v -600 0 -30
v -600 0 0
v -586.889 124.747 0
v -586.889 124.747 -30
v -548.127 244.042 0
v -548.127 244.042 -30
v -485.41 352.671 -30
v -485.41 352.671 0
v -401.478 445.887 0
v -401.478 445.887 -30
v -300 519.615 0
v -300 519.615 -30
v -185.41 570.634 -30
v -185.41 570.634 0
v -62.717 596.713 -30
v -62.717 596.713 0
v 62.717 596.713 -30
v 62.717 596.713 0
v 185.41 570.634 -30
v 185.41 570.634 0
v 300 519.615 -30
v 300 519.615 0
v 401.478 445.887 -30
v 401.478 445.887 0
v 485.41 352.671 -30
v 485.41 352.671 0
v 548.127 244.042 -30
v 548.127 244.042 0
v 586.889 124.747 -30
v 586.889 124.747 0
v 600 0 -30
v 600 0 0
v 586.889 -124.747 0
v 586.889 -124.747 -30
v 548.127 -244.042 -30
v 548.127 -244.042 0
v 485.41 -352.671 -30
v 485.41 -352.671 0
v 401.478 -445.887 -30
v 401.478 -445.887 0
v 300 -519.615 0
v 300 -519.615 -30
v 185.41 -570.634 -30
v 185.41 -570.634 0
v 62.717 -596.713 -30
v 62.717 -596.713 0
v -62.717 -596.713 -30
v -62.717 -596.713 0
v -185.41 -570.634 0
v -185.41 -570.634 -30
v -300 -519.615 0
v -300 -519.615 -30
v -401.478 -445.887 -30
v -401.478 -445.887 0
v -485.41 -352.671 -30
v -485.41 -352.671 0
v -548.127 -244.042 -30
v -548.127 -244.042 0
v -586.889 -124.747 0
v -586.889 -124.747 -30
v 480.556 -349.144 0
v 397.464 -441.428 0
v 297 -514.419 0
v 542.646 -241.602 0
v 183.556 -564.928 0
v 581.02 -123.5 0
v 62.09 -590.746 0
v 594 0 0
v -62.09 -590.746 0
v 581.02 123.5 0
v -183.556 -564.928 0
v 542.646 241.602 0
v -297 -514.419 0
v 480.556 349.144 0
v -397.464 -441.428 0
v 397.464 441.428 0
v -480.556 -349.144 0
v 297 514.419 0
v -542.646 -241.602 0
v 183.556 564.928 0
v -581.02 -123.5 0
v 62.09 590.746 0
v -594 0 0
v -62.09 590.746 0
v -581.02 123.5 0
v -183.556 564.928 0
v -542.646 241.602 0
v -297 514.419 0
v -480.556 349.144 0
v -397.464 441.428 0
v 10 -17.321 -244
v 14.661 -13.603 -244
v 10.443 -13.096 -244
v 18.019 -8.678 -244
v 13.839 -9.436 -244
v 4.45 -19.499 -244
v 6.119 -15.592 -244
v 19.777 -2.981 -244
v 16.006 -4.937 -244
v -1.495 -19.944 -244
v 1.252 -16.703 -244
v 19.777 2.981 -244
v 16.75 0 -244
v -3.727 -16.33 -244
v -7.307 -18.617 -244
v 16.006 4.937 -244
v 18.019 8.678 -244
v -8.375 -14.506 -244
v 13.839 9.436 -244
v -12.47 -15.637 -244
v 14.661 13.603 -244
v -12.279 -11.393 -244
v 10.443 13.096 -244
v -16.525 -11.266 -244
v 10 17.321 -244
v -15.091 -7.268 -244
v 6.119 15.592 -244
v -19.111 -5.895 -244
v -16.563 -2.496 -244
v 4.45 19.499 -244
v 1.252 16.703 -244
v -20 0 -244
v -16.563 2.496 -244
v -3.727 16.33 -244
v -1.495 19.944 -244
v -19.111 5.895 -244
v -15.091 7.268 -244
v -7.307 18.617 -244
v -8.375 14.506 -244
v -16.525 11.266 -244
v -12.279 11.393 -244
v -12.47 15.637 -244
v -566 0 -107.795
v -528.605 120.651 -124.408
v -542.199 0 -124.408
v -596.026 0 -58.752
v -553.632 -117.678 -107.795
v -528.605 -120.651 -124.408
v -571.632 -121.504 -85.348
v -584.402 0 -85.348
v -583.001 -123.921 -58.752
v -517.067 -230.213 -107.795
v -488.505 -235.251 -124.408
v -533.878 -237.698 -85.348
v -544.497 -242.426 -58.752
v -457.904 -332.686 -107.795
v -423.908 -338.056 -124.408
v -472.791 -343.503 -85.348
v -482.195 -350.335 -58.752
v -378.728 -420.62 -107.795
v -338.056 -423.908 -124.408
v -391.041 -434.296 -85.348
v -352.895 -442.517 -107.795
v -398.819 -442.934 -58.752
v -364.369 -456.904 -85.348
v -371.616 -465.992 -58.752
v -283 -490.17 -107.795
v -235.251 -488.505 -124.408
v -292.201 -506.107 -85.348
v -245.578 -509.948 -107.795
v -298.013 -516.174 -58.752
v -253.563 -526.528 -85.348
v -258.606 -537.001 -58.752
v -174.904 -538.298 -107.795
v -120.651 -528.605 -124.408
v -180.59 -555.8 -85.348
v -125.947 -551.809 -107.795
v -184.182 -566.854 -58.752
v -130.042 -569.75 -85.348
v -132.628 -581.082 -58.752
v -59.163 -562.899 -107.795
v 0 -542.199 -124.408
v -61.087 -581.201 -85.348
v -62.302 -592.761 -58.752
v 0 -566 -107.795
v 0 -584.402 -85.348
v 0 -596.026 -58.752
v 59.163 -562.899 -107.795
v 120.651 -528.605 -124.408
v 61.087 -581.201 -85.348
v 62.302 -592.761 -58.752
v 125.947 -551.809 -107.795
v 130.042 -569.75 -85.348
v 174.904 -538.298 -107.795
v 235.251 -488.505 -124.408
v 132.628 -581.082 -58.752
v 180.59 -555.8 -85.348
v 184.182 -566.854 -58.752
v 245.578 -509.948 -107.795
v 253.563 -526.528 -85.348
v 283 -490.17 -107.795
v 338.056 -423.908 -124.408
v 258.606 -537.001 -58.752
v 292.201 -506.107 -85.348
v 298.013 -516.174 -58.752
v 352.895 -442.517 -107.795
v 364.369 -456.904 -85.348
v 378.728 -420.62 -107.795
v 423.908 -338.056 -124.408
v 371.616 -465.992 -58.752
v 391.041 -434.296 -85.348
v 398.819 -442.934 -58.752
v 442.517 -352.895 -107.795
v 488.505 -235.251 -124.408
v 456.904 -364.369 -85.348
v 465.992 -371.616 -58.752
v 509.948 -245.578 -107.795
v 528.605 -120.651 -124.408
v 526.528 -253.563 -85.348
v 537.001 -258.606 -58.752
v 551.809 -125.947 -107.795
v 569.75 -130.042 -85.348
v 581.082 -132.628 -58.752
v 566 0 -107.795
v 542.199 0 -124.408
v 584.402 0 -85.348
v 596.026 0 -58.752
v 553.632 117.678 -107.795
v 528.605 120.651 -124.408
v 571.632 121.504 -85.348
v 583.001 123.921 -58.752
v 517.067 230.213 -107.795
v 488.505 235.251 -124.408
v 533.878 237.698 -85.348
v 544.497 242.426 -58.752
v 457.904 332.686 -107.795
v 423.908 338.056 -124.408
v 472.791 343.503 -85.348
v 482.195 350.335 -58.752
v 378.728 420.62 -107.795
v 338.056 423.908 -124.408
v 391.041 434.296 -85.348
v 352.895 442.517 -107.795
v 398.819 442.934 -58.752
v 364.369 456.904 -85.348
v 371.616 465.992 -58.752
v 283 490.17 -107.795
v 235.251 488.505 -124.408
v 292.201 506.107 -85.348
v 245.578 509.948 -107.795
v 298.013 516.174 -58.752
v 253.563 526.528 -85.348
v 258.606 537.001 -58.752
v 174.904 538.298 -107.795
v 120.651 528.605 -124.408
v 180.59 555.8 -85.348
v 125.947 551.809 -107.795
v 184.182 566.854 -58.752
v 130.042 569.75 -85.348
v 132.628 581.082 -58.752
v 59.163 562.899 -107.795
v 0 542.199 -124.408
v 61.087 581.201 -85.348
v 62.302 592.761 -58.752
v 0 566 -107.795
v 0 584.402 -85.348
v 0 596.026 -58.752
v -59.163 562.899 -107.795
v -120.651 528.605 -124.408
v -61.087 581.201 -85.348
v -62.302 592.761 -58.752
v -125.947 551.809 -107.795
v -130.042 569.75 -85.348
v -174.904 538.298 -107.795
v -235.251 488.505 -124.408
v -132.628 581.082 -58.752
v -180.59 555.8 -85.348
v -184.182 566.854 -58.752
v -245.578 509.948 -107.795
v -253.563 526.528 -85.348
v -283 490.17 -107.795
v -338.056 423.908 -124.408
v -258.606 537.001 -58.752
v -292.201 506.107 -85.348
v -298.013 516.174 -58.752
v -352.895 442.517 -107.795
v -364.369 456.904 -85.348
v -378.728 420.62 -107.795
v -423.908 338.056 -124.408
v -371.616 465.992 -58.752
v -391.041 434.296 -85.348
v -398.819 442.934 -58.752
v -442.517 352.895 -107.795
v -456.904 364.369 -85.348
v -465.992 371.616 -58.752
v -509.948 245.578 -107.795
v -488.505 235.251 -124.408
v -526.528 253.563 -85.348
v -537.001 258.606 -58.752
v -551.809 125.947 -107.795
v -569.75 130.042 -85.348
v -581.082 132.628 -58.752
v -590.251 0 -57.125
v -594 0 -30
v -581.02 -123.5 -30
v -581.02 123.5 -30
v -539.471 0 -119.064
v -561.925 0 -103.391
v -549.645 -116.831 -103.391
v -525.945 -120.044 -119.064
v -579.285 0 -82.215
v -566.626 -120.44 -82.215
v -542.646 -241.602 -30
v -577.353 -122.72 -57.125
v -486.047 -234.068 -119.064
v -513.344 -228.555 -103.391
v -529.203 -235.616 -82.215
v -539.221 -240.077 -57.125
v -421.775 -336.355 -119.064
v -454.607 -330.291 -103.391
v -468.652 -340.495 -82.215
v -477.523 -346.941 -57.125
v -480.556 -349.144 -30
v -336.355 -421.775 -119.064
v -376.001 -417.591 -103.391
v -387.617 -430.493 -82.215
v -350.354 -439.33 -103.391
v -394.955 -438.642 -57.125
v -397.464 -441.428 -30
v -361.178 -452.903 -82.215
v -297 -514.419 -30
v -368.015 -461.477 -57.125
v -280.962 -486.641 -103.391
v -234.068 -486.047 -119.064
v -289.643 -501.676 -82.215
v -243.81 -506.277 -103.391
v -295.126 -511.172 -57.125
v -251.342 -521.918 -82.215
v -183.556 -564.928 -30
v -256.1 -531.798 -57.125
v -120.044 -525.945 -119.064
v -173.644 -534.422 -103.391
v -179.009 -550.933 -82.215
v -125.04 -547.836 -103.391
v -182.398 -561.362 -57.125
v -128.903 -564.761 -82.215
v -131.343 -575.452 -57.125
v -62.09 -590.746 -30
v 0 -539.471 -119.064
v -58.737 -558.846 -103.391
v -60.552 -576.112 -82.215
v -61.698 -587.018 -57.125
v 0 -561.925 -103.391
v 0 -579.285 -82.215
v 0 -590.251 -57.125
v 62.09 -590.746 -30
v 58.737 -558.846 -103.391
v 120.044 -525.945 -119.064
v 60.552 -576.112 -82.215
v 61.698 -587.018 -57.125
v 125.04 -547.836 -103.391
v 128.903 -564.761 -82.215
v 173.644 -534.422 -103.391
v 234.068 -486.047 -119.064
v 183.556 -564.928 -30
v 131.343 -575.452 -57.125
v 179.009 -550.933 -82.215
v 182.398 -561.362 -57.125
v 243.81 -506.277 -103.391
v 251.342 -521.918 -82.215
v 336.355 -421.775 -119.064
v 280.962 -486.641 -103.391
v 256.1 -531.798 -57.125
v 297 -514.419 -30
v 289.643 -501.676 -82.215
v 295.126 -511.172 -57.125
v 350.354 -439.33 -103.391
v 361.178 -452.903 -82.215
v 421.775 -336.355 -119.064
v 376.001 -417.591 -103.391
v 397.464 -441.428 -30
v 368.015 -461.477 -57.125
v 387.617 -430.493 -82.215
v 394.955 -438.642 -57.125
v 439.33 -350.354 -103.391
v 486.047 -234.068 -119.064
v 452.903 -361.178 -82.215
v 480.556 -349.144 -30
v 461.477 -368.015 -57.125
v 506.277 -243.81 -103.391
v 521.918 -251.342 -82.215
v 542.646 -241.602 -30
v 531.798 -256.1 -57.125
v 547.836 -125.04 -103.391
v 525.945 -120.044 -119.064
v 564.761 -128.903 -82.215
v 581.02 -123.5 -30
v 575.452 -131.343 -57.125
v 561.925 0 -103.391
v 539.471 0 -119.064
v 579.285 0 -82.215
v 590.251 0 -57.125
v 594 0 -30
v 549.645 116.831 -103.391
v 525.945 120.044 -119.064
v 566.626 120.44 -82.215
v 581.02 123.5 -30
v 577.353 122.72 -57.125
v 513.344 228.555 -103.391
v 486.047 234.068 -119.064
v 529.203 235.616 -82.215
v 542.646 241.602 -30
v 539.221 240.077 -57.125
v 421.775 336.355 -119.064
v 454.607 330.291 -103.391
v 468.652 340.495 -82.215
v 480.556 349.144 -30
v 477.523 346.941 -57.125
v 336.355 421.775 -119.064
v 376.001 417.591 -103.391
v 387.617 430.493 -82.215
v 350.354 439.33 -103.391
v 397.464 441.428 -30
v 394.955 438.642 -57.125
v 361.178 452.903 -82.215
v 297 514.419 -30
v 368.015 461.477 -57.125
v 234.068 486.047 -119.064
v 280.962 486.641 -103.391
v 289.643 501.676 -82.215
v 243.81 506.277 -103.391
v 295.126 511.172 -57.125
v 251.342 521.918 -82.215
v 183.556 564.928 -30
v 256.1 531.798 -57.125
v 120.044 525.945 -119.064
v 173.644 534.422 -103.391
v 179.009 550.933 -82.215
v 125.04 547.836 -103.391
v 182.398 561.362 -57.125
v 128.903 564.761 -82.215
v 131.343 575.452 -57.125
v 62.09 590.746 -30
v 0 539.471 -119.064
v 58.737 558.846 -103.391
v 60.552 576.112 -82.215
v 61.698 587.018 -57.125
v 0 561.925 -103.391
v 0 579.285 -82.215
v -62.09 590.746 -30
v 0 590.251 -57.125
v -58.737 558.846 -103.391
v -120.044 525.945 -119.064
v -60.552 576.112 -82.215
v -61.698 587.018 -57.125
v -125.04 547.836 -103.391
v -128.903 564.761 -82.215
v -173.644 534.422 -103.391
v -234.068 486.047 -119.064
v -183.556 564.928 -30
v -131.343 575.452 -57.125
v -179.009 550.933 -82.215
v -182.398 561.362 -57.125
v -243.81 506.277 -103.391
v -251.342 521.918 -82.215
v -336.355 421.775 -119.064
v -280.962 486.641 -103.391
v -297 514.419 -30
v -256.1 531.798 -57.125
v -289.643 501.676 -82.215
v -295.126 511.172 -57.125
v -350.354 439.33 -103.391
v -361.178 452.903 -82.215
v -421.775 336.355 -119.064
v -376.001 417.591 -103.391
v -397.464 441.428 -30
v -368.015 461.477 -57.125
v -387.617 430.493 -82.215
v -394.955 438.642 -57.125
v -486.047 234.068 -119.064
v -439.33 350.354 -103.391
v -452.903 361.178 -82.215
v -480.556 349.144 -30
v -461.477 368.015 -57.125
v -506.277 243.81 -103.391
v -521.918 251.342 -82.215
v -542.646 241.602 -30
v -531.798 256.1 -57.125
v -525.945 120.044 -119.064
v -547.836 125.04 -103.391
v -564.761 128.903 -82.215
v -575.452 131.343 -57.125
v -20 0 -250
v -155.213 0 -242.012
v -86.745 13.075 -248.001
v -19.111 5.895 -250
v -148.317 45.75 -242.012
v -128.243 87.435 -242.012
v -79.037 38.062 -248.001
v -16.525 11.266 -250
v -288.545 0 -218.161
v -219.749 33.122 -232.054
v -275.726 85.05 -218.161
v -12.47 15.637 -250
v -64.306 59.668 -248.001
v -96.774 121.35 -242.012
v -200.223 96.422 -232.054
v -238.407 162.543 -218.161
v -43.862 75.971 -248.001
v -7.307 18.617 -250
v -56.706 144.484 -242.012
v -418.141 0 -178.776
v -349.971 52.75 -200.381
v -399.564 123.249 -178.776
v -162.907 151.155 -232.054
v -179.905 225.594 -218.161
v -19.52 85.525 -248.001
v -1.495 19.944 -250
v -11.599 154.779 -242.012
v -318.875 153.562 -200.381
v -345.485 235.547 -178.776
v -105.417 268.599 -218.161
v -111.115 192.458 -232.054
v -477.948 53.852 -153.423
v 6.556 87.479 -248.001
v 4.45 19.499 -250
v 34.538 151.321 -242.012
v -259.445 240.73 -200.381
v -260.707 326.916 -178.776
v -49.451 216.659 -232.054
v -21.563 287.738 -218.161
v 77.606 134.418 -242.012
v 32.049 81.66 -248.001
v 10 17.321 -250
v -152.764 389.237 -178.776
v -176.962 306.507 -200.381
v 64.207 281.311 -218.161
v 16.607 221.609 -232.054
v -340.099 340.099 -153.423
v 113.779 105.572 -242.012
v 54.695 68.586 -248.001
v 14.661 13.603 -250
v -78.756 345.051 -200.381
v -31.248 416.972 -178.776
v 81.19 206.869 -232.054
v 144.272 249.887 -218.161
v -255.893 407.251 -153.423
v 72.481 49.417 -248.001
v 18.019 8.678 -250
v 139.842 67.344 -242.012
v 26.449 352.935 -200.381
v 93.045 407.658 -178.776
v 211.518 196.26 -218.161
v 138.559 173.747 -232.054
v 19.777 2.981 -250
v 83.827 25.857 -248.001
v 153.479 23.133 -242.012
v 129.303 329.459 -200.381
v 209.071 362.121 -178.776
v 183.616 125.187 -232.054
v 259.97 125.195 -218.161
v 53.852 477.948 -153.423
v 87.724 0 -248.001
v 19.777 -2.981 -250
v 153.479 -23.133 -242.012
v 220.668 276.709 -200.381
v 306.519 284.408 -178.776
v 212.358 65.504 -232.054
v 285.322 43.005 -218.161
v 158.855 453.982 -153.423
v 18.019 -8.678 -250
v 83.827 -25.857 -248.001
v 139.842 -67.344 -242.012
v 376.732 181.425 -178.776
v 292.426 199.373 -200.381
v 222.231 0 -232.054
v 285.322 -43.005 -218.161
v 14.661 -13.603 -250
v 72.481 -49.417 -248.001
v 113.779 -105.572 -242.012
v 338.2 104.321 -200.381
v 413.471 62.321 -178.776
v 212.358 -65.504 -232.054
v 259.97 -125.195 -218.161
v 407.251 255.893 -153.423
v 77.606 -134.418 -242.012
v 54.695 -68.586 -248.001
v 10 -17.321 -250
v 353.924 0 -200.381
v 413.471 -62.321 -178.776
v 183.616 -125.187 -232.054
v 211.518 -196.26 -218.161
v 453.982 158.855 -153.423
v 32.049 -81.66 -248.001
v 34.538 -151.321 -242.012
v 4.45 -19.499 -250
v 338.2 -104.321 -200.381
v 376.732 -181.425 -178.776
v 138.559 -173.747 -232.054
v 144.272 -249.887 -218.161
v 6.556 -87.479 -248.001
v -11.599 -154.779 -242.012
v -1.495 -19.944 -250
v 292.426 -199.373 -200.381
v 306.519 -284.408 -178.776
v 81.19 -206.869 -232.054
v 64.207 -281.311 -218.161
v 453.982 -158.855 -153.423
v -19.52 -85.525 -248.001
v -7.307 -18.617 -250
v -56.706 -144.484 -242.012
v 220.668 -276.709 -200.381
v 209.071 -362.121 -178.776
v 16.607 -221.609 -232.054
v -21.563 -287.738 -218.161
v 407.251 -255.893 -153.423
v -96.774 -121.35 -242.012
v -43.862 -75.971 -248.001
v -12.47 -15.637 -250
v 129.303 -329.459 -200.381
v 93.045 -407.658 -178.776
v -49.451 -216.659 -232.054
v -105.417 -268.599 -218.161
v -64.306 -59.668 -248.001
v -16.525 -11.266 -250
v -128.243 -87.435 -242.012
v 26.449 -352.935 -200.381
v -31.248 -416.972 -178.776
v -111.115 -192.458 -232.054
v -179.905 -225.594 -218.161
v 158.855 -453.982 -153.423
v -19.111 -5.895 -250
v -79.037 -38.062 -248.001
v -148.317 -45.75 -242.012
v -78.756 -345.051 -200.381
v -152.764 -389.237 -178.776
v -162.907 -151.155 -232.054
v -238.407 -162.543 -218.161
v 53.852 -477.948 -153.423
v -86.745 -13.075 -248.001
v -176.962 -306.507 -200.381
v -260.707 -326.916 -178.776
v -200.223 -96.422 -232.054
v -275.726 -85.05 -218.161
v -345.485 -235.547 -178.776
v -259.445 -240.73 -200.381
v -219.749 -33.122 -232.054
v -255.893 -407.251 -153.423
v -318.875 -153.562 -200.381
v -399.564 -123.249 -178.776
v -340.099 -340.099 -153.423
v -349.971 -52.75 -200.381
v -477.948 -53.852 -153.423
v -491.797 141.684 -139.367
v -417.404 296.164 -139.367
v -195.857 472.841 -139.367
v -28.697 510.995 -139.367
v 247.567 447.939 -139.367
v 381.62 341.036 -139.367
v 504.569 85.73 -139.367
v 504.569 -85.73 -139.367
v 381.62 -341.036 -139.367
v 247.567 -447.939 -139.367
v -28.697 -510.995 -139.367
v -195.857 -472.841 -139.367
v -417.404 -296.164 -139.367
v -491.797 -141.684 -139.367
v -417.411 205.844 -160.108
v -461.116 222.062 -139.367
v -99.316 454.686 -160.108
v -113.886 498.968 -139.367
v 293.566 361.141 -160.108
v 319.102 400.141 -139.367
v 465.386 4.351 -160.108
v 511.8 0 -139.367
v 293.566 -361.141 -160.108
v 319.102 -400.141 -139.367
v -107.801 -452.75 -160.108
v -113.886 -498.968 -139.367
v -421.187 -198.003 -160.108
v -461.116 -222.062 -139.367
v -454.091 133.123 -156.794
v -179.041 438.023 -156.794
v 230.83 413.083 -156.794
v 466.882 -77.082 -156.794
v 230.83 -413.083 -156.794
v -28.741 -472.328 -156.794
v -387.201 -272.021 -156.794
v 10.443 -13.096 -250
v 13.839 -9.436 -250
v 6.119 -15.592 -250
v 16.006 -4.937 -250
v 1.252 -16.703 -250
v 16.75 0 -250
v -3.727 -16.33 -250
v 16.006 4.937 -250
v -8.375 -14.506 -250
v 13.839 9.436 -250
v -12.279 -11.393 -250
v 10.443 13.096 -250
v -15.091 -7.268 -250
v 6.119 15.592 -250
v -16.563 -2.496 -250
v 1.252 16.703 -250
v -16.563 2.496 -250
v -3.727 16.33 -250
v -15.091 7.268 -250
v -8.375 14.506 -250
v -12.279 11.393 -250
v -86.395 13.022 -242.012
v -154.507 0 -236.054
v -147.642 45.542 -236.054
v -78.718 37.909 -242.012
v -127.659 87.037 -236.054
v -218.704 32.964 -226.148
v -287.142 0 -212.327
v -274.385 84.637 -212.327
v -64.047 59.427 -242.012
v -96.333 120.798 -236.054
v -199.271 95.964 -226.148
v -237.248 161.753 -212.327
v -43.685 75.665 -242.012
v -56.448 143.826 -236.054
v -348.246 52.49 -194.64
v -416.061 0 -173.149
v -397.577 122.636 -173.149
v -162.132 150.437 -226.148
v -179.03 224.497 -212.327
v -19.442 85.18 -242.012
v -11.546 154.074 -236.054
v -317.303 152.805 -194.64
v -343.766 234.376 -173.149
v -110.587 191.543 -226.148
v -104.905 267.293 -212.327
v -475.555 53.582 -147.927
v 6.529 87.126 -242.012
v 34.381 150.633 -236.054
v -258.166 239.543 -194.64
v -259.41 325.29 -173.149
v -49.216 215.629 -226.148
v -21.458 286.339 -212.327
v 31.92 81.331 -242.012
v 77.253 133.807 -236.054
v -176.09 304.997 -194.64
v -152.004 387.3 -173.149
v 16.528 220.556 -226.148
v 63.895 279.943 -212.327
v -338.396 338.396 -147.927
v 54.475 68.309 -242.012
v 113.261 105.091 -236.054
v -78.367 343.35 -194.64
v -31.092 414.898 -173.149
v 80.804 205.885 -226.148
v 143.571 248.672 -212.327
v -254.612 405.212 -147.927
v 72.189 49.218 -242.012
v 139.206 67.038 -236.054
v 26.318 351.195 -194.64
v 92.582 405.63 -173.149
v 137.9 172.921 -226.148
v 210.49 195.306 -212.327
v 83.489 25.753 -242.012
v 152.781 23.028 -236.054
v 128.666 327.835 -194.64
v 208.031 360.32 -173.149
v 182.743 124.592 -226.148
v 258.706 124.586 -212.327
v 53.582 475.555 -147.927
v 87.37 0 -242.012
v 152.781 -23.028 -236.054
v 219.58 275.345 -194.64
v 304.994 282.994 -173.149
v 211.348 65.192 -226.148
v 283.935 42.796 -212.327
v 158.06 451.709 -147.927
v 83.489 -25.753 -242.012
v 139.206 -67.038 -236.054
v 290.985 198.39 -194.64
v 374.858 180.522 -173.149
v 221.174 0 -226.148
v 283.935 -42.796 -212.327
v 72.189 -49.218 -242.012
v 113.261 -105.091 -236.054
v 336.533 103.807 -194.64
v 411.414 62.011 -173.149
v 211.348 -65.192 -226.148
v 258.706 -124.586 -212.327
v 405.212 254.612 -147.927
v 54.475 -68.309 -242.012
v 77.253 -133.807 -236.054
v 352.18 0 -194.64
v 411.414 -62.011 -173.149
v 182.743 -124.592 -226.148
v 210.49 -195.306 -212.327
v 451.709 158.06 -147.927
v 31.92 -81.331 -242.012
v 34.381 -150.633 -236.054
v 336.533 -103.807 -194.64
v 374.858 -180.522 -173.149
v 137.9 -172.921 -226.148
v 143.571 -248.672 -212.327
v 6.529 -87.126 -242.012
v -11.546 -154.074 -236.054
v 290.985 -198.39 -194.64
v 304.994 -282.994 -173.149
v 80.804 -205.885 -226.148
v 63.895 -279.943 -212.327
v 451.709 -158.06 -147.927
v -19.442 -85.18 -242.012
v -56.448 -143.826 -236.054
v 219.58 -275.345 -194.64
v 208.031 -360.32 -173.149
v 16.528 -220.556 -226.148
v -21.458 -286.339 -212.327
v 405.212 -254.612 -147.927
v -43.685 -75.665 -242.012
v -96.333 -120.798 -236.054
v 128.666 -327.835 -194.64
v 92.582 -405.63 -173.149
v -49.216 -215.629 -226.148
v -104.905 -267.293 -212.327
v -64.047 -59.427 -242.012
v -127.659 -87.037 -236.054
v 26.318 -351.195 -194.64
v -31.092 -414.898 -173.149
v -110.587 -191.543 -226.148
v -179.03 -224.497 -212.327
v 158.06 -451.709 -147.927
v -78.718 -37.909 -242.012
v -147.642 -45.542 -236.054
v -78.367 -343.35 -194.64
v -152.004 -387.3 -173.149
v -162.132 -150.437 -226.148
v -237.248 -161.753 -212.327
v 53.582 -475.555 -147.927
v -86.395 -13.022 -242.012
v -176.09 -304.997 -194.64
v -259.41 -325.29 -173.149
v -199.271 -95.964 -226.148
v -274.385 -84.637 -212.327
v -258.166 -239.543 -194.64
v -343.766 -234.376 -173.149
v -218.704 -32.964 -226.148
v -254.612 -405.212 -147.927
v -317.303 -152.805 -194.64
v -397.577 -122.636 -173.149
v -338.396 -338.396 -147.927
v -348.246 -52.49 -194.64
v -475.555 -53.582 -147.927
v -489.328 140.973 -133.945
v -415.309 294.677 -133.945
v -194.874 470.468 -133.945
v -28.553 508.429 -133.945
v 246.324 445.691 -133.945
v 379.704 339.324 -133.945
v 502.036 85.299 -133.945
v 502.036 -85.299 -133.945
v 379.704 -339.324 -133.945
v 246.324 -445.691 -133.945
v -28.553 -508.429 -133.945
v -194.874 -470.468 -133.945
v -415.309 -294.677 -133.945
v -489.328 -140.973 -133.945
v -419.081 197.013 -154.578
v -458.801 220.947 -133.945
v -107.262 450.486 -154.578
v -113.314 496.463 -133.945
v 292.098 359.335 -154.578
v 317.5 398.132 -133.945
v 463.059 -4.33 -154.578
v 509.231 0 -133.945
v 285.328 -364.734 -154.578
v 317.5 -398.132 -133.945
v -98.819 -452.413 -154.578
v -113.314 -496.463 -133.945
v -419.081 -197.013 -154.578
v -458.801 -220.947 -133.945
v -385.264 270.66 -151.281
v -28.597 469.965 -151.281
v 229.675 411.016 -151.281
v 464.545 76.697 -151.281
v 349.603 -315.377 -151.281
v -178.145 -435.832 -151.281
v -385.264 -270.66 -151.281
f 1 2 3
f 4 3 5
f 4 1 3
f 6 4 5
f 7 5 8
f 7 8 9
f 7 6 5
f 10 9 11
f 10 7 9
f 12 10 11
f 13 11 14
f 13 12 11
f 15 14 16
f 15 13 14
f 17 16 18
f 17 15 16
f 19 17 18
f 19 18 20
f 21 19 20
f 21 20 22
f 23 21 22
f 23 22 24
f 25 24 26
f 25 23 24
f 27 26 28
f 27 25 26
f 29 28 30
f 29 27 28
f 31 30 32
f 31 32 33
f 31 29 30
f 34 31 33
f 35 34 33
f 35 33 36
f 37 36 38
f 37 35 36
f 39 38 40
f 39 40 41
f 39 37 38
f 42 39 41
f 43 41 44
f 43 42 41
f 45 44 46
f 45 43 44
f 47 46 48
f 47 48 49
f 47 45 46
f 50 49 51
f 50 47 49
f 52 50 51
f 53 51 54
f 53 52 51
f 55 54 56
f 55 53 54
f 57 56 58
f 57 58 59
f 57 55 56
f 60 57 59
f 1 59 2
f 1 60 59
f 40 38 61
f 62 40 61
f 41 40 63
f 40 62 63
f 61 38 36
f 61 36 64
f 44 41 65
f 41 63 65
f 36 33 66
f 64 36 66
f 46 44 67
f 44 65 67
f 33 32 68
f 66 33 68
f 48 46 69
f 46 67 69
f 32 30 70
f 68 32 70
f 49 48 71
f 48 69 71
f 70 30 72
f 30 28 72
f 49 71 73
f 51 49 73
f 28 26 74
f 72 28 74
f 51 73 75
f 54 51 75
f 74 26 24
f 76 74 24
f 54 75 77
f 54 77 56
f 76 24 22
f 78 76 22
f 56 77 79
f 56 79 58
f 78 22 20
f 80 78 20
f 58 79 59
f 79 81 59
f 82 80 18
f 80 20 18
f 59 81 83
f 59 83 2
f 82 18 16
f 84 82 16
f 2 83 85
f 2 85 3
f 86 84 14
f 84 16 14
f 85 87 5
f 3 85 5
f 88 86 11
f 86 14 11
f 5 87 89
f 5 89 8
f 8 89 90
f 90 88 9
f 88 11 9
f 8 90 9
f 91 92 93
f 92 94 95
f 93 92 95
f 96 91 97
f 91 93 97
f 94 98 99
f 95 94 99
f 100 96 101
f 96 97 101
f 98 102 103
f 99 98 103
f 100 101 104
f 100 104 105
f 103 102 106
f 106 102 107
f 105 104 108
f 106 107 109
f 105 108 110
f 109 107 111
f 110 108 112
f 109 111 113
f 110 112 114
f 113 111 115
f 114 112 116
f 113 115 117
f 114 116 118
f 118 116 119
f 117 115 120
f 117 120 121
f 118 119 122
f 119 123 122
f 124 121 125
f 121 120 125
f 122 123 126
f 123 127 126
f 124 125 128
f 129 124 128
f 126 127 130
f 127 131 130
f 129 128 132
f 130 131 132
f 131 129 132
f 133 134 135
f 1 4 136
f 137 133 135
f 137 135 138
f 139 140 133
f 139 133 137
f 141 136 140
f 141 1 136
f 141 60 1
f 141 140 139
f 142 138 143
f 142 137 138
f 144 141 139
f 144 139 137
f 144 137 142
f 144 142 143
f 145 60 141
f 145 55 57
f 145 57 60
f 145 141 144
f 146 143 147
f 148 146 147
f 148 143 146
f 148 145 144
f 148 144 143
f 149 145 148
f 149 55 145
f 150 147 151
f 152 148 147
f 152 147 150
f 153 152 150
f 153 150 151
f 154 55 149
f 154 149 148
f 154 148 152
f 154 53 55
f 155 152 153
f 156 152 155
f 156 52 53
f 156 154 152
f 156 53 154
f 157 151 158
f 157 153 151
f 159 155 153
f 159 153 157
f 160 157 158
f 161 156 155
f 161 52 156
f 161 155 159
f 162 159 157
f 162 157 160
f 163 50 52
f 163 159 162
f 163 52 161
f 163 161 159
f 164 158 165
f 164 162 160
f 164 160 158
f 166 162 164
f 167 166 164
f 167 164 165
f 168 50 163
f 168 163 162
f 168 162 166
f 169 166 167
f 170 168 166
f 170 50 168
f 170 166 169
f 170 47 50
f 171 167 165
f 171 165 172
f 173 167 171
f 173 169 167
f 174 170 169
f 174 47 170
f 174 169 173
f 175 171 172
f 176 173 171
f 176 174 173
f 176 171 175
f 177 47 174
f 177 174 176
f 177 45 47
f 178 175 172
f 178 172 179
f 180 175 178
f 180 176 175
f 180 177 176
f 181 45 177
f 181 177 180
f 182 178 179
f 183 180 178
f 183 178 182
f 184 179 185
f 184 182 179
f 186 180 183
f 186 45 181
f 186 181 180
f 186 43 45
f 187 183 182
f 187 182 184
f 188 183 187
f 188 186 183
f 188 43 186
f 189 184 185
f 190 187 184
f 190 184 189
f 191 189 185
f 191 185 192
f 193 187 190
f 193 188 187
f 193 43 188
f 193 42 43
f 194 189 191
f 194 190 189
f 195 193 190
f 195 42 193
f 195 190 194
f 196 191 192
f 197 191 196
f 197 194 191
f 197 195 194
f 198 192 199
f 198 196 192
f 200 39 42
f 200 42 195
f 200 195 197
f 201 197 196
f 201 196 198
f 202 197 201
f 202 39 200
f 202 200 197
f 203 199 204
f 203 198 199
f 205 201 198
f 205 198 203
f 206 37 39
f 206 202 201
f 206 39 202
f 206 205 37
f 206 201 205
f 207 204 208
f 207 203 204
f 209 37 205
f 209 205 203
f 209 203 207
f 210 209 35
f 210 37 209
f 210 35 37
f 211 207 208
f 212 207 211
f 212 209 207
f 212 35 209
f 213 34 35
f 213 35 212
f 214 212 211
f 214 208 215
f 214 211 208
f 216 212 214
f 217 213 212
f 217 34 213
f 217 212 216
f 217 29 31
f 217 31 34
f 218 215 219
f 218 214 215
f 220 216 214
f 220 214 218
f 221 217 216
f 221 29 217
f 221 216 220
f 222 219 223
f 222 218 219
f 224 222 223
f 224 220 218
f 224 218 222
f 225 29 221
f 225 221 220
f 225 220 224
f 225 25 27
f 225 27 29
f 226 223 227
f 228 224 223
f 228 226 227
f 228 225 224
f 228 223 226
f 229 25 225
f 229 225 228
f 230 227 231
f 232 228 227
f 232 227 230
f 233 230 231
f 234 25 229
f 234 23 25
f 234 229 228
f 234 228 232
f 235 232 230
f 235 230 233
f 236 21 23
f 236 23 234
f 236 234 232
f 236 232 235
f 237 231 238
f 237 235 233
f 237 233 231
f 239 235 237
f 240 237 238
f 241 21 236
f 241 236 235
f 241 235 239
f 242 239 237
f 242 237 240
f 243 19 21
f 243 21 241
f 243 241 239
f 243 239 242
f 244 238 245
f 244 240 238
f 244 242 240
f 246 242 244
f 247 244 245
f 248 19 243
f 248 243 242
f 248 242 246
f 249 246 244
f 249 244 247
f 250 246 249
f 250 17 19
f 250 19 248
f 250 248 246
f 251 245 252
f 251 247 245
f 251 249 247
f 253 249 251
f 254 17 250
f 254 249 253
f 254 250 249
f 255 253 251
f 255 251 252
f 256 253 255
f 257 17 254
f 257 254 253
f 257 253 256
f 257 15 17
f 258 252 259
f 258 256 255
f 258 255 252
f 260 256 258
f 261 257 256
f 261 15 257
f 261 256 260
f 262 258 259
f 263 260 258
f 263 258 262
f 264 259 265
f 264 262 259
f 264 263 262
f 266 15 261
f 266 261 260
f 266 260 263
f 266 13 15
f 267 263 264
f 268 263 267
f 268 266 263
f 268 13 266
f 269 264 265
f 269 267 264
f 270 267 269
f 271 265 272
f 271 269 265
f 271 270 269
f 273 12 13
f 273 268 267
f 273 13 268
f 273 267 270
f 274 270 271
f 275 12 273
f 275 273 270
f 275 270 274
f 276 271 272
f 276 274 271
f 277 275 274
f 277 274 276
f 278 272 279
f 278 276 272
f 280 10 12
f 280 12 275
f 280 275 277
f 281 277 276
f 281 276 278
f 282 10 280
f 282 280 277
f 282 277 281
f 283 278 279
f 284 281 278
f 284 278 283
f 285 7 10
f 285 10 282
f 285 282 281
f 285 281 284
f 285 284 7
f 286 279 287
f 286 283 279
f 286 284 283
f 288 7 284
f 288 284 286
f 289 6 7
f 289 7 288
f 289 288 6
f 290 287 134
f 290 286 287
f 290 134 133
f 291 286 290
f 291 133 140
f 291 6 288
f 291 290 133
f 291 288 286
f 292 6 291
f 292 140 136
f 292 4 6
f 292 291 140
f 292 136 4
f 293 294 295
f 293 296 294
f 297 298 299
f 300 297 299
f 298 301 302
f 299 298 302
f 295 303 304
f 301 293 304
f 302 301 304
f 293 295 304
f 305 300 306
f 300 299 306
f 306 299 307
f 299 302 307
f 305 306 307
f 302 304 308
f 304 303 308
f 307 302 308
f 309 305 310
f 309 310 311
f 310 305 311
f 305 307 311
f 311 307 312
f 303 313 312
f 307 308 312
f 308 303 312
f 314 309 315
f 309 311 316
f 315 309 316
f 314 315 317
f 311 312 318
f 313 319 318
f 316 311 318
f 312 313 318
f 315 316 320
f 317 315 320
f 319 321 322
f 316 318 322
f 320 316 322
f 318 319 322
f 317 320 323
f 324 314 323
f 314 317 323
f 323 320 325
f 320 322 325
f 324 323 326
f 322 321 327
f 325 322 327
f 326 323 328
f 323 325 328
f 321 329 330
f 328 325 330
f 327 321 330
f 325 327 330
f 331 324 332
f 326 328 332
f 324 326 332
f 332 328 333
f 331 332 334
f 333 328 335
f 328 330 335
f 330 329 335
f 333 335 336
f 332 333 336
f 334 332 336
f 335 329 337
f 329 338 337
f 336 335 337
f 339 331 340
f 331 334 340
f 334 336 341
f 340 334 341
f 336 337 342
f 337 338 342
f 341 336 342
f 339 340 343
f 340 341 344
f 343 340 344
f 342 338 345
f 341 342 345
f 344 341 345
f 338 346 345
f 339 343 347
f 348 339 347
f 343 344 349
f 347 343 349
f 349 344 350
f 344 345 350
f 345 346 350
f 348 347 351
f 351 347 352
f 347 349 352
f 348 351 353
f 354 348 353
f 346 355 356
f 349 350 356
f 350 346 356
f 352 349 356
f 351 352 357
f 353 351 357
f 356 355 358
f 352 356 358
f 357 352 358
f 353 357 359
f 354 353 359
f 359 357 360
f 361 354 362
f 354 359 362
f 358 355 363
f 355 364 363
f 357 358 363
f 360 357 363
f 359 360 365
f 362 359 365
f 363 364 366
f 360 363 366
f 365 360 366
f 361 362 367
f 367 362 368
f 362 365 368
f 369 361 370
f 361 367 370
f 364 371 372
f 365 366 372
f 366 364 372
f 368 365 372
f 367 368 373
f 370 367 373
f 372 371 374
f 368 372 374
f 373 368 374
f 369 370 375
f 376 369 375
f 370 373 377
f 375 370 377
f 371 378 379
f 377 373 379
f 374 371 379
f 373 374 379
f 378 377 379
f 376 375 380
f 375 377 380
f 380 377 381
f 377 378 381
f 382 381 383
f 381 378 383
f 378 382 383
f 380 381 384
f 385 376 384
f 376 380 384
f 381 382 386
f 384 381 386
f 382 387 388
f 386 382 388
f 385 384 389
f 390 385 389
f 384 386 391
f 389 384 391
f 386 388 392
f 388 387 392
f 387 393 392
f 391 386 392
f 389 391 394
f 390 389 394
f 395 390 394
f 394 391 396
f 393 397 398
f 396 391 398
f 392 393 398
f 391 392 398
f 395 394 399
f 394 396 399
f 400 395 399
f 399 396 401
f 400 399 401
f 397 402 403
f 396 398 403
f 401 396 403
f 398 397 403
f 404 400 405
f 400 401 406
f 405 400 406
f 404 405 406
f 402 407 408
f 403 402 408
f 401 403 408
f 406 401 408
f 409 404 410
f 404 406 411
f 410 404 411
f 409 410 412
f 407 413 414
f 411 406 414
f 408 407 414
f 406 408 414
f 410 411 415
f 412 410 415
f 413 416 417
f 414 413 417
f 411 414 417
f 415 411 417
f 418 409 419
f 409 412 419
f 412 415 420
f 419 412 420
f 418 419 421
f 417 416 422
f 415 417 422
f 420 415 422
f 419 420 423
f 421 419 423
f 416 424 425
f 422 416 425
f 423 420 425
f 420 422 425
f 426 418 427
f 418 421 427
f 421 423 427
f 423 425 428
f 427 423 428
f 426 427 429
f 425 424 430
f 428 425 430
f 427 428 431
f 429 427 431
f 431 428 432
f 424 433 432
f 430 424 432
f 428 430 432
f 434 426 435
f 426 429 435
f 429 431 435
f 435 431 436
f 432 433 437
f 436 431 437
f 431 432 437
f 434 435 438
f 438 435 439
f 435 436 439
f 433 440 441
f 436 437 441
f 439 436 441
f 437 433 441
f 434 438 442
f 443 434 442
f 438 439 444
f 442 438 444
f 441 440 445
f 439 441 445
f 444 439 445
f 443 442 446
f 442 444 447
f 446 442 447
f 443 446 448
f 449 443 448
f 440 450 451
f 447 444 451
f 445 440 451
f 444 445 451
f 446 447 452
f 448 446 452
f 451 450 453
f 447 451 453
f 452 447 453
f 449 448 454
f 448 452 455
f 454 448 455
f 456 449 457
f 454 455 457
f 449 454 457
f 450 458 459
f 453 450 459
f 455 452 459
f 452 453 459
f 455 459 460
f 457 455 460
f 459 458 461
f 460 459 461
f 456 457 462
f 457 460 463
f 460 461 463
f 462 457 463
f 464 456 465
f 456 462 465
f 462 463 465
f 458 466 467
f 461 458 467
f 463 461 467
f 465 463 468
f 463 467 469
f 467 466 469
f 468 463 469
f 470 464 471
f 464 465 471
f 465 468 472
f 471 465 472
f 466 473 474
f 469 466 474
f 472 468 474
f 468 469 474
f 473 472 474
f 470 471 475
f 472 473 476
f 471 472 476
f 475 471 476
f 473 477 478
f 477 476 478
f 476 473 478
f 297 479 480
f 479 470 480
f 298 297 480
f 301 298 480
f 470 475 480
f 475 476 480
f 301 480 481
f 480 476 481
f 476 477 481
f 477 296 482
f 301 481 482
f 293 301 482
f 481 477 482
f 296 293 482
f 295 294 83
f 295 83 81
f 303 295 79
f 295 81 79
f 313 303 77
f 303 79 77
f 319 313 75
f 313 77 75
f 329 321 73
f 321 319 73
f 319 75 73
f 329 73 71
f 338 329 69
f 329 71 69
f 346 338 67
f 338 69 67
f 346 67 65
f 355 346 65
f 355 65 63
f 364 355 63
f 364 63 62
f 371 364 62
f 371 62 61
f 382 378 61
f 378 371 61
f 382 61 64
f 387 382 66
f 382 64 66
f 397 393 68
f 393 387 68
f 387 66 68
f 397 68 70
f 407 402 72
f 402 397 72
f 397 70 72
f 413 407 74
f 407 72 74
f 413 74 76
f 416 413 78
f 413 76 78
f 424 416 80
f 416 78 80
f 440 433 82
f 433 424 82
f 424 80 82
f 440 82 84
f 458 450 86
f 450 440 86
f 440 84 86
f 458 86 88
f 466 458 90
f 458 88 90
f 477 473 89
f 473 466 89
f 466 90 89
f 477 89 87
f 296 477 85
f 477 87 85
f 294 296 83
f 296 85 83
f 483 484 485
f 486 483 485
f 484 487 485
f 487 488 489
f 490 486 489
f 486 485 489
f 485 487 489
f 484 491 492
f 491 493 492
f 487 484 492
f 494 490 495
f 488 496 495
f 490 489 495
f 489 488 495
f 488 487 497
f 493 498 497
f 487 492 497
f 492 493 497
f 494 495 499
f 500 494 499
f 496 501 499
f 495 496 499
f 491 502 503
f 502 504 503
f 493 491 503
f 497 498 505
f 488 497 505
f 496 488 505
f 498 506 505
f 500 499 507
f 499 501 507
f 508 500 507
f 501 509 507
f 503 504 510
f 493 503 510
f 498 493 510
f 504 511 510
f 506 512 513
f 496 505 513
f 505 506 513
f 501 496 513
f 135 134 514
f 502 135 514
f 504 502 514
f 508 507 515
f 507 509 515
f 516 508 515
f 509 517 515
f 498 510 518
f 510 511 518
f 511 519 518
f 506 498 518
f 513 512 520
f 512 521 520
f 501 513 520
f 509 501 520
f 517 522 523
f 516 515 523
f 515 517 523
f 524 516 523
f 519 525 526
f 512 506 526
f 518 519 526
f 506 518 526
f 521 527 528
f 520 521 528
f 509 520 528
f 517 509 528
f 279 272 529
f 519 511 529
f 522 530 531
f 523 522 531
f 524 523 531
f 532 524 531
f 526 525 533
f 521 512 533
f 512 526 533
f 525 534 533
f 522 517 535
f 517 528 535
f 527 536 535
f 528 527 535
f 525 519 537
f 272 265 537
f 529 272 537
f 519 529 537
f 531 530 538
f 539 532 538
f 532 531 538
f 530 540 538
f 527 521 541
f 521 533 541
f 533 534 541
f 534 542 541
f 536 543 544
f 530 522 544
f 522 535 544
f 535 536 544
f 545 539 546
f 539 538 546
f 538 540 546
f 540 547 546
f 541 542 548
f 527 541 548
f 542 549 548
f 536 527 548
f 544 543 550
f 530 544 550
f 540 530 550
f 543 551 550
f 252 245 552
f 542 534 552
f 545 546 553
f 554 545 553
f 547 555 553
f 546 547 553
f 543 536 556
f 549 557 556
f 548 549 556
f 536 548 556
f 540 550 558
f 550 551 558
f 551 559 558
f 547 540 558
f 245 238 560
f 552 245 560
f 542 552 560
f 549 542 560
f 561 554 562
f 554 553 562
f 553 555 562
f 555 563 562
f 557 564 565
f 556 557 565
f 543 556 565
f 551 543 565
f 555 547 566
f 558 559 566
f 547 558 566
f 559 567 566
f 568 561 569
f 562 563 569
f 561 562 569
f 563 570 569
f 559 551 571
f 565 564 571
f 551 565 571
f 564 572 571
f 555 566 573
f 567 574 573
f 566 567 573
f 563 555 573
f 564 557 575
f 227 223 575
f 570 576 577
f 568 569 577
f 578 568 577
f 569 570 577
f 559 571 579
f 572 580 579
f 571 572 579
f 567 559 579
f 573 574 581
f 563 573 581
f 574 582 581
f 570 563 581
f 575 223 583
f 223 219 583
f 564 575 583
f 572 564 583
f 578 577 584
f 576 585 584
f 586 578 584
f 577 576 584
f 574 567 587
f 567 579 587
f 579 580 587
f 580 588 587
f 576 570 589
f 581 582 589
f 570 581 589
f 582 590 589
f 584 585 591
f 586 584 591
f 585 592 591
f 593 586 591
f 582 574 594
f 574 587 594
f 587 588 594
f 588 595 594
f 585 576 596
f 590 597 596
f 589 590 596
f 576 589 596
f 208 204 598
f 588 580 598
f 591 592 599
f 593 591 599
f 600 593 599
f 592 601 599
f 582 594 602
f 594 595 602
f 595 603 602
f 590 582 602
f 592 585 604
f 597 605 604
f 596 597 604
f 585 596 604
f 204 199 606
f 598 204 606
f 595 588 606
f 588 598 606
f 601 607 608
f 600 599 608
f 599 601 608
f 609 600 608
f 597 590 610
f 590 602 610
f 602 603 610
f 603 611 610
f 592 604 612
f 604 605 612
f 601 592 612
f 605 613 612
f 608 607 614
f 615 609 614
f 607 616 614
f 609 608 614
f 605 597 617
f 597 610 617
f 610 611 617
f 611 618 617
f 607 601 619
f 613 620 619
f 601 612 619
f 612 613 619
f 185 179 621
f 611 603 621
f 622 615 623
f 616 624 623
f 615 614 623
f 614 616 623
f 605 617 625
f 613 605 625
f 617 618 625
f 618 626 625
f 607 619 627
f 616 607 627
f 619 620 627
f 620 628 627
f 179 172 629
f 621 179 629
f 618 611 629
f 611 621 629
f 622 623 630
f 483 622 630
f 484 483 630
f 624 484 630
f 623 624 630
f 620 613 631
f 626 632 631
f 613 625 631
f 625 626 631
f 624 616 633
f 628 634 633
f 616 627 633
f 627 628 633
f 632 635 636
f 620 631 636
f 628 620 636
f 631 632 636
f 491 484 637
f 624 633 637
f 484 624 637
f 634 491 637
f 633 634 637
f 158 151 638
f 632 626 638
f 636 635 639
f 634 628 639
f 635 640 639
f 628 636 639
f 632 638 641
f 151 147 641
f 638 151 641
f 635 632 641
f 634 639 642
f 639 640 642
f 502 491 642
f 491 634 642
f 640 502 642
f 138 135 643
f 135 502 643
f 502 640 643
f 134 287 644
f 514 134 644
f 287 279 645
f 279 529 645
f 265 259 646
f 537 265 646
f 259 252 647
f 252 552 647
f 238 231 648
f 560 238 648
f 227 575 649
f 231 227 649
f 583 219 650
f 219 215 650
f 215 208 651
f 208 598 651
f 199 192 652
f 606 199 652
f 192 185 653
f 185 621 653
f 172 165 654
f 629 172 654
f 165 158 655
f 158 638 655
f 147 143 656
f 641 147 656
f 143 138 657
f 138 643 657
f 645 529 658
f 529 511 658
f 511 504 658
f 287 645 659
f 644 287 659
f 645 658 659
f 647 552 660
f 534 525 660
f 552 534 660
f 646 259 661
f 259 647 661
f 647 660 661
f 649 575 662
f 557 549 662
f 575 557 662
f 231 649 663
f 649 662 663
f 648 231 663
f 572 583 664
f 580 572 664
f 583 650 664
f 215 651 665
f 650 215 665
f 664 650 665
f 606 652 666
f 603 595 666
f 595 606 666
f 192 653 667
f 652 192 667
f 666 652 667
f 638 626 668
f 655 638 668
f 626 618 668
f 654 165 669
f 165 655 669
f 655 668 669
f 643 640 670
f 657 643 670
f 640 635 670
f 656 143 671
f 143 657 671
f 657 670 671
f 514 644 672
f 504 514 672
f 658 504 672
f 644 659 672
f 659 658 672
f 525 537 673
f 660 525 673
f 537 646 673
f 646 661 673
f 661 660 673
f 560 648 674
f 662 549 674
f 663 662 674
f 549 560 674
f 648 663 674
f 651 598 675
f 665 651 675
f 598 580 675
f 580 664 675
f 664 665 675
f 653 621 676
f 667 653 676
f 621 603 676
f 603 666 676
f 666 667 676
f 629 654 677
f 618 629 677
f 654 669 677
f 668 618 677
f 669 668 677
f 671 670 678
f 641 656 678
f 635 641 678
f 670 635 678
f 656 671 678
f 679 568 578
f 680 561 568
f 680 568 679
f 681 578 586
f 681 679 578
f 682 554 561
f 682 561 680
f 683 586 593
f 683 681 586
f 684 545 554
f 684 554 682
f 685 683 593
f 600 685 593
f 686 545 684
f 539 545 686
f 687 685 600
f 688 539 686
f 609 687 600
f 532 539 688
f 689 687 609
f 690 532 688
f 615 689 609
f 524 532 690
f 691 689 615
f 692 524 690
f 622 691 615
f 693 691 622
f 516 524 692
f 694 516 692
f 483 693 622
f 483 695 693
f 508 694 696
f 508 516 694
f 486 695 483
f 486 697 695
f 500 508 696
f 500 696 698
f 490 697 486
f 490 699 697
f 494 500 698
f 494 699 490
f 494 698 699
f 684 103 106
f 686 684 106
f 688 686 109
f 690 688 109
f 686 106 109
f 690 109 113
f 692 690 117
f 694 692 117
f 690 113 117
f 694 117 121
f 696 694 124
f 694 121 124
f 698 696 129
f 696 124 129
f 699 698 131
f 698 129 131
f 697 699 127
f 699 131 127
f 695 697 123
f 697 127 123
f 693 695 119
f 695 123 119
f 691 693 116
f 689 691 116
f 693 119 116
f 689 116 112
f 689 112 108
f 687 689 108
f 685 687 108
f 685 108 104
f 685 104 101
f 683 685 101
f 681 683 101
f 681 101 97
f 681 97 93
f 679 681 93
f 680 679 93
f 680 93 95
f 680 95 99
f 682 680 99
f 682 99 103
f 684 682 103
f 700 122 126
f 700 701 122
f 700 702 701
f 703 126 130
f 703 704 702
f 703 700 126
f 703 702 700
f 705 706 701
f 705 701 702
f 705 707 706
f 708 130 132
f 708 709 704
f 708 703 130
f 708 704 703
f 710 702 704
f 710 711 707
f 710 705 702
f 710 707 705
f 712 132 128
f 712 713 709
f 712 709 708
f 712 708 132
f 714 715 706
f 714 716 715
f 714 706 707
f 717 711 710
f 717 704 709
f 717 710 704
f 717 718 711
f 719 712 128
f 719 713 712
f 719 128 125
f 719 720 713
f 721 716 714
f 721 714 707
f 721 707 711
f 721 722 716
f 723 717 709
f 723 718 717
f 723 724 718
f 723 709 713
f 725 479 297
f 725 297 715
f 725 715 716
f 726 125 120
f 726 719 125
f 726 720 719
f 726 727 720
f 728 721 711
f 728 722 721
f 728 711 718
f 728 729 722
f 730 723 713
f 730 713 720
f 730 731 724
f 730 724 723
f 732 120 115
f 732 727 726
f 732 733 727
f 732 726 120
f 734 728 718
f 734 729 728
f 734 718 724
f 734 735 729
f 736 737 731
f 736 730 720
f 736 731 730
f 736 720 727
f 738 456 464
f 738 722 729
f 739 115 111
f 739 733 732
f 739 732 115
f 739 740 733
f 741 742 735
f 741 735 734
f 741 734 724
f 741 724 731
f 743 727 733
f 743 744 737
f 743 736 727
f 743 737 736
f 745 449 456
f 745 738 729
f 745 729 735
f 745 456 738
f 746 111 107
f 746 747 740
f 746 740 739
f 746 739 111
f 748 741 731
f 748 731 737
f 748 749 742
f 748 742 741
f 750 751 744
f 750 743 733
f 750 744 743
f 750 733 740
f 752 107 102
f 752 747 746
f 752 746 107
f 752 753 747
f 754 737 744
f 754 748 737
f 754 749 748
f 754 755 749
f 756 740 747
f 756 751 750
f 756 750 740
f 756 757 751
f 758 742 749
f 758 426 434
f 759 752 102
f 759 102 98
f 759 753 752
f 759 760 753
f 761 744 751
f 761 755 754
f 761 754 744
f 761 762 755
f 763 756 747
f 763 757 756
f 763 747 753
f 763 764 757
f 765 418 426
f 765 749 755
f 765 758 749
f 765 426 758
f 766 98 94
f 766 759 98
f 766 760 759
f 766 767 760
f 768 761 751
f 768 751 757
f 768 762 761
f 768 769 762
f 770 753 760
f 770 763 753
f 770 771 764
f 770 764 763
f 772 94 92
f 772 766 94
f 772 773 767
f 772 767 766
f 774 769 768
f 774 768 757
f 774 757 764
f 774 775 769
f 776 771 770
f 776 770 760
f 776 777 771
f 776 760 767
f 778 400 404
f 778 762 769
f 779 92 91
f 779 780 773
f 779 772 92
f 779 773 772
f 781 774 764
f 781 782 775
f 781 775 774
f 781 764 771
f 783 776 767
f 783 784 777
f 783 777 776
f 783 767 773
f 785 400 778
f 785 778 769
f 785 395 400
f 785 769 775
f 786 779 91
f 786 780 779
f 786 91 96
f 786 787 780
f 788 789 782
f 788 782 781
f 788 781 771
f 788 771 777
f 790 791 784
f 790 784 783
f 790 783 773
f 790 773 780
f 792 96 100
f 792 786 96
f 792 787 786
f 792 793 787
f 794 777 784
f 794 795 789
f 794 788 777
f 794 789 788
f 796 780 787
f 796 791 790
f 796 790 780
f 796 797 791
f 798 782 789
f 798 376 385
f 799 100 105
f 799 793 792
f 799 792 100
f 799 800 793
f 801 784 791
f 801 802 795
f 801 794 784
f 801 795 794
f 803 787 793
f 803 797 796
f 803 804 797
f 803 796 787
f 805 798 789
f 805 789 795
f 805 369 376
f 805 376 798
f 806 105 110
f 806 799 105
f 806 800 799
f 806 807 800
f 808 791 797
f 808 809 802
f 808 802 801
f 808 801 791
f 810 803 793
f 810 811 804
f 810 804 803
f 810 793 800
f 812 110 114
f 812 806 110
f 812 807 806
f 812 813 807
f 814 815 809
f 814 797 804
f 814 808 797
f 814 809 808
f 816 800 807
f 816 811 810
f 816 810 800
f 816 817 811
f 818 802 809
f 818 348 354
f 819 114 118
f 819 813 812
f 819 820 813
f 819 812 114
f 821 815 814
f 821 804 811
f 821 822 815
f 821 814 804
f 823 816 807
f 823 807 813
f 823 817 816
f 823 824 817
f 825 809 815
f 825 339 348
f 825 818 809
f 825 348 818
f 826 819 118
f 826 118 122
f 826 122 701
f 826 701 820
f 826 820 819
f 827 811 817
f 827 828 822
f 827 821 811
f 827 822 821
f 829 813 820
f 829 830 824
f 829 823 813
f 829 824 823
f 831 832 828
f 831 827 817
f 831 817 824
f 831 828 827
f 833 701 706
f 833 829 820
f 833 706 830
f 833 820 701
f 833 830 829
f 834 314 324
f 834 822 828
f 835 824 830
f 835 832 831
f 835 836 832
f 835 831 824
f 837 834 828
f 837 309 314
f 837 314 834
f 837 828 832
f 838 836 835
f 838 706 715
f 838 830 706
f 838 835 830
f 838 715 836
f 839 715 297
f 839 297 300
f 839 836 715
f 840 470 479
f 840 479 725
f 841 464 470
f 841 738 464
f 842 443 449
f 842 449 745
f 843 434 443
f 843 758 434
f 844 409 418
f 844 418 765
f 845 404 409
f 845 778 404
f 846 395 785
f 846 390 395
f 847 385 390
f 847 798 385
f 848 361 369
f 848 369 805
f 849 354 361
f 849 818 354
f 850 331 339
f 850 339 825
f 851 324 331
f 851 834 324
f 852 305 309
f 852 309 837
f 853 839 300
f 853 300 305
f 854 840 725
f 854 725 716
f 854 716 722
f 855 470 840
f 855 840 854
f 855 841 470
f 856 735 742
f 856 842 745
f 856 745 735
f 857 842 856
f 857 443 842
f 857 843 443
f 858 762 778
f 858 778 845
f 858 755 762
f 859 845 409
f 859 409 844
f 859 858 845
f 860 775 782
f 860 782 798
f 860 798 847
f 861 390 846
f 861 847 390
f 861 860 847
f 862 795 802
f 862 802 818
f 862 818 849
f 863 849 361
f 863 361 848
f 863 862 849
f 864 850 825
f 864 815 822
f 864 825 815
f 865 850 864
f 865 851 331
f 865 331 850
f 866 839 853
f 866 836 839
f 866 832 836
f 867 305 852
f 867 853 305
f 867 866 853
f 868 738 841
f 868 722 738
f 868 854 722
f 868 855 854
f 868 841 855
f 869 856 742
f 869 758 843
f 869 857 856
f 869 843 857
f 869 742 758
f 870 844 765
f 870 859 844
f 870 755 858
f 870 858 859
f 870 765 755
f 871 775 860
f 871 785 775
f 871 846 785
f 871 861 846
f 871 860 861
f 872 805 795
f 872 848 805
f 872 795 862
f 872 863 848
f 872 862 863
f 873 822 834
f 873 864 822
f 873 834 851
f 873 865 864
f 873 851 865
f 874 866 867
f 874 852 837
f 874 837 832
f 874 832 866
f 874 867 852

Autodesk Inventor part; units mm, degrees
ref_plane "YZ Plane" through (0, 0, 0) normal (1, 0, 0) x (0, 1, 0)
ref_plane "XZ Plane" through (0, 0, 0) normal (0, 1, 0) x (-1, 0, 0)
ref_plane "XY Plane" through (0, 0, 0) normal (0, 0, 1) x (1, 0, 0)
sketch "Sketch1" plane through (0, 0, 0) normal (0, 1, 0) x (-1, 0, 0)
  line L0 (600, 0) -> (600, -30)
  arc A0 (542.1993, -124.4078) -> (600, -30) centre (494, -30) ccw
  arc A1 (20, -250) -> (542.1993, -124.4078) centre (20, 898.4211) ccw
  line L1 (0, 0) -> (0, -191.6842)
  arc A2 (20, -244) -> (539.4711, -119.0639) centre (20, 898.4211) ccw
  arc A3 (539.4711, -119.0639) -> (594, -30) centre (494, -30) ccw
  line L2 (594, -30) -> (594, 0)
  line L3 (594, 0) -> (600, 0)
  line L4 (0, -244) -> (0, -250)
  line L5 (0, -250) -> (20, -250)
  line L6 (0, -244) -> (20, -244)
  point P0 (0, 0)
  point P1 (0, -163.7009)
  point P2 (0, -169.7009)
  dimension "d1" = 30
  dimension "d3" = 1148.421
  dimension "d11" = 1188
  dimension "d12" = 250
  dimension "d13" = 6
  dimension "d14" = 40
  dimension "d15" = 100
revolve "Revolution1" add sketch "Sketch1" angle 360 about axis through (0, 0, 0) along (0, 0, -1)
sketch "Sketch2" plane through (0, 0, 0) normal (0, 0, 1) x (1, 0, 0)
  circle A0 centre (0, 0) radius 16.75
  dimension "d8" = 33.5
extrude "Extrusion1" cut sketch "Sketch2" against normal through all
properties part number "PRS 1604 dished head_D1200"
